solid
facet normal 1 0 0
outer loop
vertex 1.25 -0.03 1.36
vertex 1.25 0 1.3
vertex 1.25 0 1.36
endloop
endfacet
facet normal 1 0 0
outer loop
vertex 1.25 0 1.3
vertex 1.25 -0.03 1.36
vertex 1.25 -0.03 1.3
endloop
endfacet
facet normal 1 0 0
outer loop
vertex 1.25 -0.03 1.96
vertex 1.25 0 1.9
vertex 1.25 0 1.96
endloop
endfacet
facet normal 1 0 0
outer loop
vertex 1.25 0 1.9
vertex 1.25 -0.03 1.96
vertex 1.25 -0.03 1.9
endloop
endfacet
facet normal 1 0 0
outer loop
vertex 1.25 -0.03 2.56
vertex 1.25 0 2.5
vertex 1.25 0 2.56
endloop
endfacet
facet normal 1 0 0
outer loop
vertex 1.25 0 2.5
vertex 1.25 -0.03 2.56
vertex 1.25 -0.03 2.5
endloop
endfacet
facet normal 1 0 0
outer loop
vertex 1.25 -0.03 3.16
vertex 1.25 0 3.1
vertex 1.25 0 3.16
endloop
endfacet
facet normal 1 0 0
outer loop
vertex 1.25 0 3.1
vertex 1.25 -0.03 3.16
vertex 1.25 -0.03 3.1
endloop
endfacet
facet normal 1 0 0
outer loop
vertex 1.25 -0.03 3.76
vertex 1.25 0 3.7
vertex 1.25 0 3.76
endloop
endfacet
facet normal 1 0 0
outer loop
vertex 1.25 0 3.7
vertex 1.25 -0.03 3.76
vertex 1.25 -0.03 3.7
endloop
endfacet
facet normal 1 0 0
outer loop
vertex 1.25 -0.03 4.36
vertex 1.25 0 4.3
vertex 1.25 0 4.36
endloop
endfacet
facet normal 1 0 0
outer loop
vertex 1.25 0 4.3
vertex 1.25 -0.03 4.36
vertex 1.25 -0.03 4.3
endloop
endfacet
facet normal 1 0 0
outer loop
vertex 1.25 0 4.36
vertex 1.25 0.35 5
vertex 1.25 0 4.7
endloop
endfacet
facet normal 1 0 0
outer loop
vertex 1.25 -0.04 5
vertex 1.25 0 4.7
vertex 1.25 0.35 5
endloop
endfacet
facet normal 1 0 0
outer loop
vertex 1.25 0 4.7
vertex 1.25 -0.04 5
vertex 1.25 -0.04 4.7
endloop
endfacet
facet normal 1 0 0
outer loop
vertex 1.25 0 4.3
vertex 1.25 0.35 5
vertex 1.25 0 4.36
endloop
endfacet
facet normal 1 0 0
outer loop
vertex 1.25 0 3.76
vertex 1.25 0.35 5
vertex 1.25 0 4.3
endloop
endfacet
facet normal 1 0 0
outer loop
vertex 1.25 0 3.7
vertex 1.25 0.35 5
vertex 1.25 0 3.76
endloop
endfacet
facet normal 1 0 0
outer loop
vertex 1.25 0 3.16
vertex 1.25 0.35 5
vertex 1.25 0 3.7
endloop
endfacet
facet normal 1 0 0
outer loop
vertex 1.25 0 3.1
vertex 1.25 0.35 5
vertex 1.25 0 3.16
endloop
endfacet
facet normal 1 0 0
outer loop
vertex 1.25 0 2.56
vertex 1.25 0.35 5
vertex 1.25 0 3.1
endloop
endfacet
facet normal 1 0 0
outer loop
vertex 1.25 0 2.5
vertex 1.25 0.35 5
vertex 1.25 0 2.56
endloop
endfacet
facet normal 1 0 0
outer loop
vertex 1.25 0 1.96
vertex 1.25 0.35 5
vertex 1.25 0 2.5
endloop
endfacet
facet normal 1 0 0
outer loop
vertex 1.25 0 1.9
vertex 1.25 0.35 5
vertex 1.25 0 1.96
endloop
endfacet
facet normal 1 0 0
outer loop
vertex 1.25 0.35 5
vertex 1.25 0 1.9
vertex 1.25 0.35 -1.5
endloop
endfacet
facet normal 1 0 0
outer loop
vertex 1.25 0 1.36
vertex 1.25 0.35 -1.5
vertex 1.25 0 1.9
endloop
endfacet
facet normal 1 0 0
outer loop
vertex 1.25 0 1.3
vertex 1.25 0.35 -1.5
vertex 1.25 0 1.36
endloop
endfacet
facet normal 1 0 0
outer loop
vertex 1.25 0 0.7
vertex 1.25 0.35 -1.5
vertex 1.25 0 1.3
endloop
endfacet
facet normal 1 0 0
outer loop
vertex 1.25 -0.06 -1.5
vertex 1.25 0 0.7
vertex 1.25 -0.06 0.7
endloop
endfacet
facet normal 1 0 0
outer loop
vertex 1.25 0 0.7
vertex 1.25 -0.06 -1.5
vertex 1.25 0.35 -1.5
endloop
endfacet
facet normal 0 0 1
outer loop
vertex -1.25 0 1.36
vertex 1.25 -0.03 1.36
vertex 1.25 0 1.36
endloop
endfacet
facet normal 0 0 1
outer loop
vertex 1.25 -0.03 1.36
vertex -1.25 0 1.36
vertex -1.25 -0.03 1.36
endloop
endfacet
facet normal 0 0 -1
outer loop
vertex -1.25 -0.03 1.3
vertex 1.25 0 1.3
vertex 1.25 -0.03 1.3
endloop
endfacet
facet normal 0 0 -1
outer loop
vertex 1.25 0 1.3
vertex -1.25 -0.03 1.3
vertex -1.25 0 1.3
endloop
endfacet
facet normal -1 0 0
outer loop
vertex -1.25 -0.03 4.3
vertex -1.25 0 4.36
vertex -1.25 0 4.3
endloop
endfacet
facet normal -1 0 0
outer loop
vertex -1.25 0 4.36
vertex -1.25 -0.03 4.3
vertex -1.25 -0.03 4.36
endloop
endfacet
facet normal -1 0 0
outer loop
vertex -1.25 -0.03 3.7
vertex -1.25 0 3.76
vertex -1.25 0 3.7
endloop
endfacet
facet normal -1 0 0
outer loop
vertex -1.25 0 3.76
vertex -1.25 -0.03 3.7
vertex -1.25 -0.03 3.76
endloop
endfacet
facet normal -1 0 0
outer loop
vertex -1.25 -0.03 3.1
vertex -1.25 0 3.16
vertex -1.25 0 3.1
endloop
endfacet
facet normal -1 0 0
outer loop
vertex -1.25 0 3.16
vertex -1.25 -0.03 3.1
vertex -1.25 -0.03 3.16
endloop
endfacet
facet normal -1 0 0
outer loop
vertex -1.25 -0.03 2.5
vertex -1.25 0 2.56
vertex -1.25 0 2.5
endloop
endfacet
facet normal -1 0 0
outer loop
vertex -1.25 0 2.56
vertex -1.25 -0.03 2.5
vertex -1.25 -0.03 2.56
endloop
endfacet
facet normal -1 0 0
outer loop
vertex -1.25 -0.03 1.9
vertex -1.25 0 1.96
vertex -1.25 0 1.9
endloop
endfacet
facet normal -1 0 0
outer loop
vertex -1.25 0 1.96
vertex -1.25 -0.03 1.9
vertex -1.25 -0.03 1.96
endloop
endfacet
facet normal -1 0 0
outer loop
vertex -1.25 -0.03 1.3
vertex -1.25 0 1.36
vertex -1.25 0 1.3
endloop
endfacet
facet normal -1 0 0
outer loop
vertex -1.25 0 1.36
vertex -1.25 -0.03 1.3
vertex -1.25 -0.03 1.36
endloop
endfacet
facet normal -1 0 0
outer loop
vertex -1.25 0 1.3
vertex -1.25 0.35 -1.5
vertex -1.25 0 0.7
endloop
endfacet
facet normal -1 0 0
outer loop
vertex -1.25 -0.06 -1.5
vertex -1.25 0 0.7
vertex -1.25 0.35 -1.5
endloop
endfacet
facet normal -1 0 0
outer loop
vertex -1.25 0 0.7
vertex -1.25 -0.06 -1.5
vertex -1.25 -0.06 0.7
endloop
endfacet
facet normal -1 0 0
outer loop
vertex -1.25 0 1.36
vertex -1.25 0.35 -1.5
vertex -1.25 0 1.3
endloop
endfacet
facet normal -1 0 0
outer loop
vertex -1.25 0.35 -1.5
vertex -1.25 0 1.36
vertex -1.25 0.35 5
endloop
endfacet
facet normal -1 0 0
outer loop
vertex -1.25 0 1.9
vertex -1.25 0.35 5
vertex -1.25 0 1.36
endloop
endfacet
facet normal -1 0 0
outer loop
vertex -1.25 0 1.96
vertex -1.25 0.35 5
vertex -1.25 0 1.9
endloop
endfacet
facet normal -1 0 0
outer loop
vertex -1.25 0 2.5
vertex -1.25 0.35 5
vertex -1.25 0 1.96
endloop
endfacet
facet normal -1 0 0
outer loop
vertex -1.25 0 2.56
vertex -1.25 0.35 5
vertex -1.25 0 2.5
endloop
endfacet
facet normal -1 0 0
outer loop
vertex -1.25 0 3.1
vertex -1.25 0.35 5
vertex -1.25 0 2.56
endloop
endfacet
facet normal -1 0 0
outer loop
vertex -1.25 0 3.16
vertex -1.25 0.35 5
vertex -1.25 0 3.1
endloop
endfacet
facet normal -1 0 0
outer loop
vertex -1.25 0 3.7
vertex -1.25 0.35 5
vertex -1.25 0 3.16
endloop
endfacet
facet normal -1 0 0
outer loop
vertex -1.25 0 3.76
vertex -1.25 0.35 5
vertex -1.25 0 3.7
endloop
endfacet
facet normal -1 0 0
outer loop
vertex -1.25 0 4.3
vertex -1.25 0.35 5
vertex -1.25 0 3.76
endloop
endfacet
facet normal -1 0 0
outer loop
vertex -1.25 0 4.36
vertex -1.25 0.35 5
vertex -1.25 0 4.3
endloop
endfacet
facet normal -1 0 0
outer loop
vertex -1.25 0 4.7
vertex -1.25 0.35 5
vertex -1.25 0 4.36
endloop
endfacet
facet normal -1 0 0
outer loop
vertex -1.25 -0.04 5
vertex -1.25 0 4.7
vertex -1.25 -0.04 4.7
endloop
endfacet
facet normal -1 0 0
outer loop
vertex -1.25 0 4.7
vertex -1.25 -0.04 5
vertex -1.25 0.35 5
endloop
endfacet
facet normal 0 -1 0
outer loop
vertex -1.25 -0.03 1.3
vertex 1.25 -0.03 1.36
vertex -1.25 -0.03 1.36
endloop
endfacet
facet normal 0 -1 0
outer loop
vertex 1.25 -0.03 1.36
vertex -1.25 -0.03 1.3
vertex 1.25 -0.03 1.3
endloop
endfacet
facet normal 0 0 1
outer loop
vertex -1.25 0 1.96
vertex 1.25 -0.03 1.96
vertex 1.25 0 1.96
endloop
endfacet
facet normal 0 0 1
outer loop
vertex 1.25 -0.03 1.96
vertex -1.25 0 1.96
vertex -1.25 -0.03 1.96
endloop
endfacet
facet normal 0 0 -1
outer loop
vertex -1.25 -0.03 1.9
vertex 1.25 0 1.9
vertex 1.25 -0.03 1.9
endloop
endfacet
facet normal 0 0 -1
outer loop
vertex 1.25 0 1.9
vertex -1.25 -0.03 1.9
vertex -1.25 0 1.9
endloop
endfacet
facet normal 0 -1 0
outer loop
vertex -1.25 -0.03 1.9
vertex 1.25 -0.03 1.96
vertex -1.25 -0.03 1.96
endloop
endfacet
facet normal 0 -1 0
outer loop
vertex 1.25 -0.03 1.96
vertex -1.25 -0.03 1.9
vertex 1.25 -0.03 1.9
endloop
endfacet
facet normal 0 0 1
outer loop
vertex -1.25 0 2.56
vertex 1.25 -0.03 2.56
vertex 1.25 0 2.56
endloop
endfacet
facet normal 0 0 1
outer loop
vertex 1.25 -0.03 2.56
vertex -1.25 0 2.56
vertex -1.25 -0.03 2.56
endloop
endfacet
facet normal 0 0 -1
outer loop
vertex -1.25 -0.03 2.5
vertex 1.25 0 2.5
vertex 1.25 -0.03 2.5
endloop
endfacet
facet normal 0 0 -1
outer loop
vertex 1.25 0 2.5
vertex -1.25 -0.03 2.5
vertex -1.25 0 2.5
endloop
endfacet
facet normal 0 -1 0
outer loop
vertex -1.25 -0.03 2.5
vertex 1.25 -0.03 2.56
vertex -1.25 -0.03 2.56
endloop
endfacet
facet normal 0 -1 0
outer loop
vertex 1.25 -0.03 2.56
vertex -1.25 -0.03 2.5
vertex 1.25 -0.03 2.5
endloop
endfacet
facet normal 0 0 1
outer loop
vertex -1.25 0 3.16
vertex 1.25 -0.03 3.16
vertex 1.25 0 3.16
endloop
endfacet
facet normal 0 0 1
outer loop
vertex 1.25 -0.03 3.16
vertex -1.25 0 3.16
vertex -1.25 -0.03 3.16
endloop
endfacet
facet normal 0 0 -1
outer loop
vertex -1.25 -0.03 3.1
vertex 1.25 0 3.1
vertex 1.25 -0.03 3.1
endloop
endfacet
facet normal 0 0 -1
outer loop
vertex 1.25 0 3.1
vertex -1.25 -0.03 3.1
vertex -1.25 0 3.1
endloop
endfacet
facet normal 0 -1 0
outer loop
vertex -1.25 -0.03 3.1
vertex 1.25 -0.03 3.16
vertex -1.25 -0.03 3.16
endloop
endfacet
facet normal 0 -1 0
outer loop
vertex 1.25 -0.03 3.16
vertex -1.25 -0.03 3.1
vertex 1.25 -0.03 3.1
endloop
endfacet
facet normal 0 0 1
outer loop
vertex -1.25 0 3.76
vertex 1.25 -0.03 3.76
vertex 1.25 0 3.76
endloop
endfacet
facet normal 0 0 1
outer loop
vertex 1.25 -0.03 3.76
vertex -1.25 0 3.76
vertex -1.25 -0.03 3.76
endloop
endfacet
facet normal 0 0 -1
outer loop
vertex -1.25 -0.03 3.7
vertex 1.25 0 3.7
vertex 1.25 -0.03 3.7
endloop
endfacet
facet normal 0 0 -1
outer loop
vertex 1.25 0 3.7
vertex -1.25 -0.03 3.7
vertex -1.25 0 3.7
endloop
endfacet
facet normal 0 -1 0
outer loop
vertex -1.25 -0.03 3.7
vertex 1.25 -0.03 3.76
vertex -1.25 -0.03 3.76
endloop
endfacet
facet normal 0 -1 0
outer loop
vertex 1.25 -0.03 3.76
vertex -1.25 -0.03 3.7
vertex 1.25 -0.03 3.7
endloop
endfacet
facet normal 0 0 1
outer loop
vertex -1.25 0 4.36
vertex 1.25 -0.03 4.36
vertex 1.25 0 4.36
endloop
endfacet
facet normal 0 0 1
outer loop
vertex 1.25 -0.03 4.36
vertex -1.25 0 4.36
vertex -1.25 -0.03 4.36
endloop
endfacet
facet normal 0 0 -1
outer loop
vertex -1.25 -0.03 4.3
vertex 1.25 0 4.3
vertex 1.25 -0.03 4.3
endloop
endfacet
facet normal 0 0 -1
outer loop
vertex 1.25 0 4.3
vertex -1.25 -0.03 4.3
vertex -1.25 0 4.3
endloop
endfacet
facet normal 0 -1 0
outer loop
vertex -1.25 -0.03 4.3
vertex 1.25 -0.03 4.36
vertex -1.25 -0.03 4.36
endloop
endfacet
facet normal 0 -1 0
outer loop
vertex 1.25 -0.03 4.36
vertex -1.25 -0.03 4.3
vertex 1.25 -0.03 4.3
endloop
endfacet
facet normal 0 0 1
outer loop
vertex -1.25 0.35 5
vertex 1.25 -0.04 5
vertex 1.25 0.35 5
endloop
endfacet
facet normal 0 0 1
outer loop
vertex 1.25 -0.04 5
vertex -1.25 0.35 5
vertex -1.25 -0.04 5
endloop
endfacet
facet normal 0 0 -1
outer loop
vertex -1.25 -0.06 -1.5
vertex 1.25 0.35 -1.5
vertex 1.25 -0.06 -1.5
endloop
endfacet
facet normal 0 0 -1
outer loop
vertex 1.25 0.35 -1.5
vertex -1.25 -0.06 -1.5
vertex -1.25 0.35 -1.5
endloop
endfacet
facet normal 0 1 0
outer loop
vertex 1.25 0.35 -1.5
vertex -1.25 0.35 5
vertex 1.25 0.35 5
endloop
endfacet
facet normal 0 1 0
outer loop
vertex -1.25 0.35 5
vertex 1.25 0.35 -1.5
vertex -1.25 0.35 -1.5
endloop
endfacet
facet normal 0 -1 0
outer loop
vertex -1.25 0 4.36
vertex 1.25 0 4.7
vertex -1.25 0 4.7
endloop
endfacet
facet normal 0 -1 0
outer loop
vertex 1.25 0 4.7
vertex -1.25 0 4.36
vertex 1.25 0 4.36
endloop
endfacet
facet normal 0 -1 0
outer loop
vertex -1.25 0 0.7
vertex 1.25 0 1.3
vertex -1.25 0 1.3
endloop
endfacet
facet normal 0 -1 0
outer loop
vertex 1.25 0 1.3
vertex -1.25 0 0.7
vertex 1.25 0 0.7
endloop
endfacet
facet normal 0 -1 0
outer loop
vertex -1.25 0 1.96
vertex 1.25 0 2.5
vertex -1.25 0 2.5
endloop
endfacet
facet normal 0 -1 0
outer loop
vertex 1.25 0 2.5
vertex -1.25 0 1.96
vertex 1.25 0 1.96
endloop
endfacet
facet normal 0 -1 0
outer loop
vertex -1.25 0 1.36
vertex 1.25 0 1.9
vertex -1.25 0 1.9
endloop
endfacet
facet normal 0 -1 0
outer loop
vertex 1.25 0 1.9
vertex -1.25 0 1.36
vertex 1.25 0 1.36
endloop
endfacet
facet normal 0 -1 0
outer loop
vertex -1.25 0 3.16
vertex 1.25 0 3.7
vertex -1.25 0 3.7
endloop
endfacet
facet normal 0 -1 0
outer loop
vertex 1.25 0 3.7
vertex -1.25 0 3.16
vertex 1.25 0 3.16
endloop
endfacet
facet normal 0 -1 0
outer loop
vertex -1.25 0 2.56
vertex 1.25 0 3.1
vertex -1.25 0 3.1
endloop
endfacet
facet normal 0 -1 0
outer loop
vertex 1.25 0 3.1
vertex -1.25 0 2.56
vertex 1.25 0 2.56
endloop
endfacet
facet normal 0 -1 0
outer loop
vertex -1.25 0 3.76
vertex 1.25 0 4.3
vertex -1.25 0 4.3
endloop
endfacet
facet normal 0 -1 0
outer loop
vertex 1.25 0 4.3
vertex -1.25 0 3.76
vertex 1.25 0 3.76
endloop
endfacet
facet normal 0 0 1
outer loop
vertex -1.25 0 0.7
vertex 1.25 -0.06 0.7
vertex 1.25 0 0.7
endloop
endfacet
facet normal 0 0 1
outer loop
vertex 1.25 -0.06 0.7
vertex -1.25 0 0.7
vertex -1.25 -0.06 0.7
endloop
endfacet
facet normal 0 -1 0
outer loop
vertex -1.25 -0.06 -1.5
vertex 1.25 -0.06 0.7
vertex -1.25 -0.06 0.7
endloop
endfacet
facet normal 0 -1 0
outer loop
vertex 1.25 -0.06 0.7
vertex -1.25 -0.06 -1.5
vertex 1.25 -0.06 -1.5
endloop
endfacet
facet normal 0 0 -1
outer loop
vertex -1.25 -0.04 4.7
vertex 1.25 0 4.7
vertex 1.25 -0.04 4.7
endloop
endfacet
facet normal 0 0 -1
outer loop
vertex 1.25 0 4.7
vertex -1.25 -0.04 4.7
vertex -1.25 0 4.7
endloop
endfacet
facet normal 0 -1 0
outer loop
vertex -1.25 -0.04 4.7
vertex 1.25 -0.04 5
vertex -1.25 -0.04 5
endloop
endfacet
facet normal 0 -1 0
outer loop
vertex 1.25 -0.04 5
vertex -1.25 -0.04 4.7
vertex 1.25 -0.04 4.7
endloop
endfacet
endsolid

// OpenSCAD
// file: lib/lodge_kit.scad
// Lodge shell tile kit — shared dimensions and modules.
//
// The game paints a lodge footprint in 5 m cells and resolves the
// exterior from these tiles at half-cell (2.5 m) resolution; see
// internal/world/lodge_shell.go. Every tile is authored in the same
// canonical frame:
//
//   * origin on the lodge floor plane (Z = 0);
//   * wall-type tiles sit on a footprint edge, centred on it, with the
//     OUTSIDE toward SCAD −Y (game +Z) and the wall thickness toward +Y;
//   * roof tiles are centred on a half-cell, with Z = 0 at the tile's
//     lowest corner; slopes fall toward −Y (game +Z);
//   * corner tiles sit on a grid vertex; an outer corner's building is
//     in the SCAD (−X, +Y) quadrant, an inner corner's notch in (+X, −Y).
//
// Colours are near-neutral: the renderer tints walls and roofs per lodge
// from a seeded palette (world.ShellPalette).
//
// Keep these in sync with the constants in lodge_shell.go.

tile   = 2.5;   // ShellTileSize
wall_h = 5.0;   // ShellWallHeight
rise   = 2.1;   // ShellRoofRise, per tile of run
pitch  = rise / tile;

wall_t   = 0.35;  // wall thickness
sink     = 1.5;   // walls run this far below the floor to hide pad grading
roof_t   = 0.25;  // roof slab thickness
overhang = 0.7;   // eaves overhang past the wall plane

c_wall   = [0.92, 0.90, 0.86];
c_stone  = [0.62, 0.61, 0.60];
c_trim   = [0.97, 0.97, 0.95];
c_glass  = [0.30, 0.42, 0.52];
c_door   = [0.36, 0.25, 0.18];
c_roof   = [0.97, 0.97, 0.97];
c_fascia = [0.55, 0.52, 0.50];

// Plain wall panel: timber above a stone plinth, a trim band under the
// eaves.
module wall_panel() {
    color(c_wall)
        translate([-tile/2, 0, -sink]) cube([tile, wall_t, wall_h + sink]);
    color(c_stone)
        translate([-tile/2, -0.06, -sink]) cube([tile, wall_t, sink + 0.7]);
    color(c_trim)
        translate([-tile/2, -0.04, wall_h - 0.3]) cube([tile, 0.1, 0.3]);
    battens();
}

// Horizontal board lines above the plinth.
module battens() {
    color(c_wall * 0.8)
        for (z = [1.3 : 0.6 : wall_h - 0.6])
            translate([-tile/2, -0.03, z]) cube([tile, 0.04, 0.06]);
}

// A framed pane on the outer face. x0/w along the wall, z0/h up it.
module pane(x0, w, z0, h) {
    color(c_trim)
        translate([x0 - 0.1, -0.05, z0 - 0.1]) cube([w + 0.2, 0.06, h + 0.2]);
    color(c_glass)
        translate([x0, -0.08, z0]) cube([w, 0.06, h]);
}

module wall_window() {
    wall_panel();
    pane(-0.7, 1.4, 1.4, 2.2);
    color(c_trim) translate([-0.02, -0.1, 1.4]) cube([0.04, 0.04, 2.2]); // mullion
}

// Tall window flanked by shutters.
module wall_window_alt() {
    wall_panel();
    pane(-0.5, 1.0, 1.2, 2.8);
    color(c_door) {
        translate([-1.0, -0.1, 1.2]) cube([0.4, 0.05, 2.8]);
        translate([ 0.6, -0.1, 1.2]) cube([0.4, 0.05, 2.8]);
    }
}

// Floor-to-eave glazing for food courts: a low stone sill, then glass in
// three lights.
module wall_glazed() {
    color(c_wall)
        translate([-tile/2, 0, -sink]) cube([tile, wall_t, wall_h + sink]);
    color(c_stone)
        translate([-tile/2, -0.06, -sink]) cube([tile, wall_t, sink + 0.35]);
    color(c_glass)
        translate([-tile/2, -0.09, 0.35]) cube([tile, 0.06, wall_h - 0.75]);
    color(c_trim) {
        for (x = [-tile/2, -tile/6, tile/6, tile/2 - 0.08])
            translate([x, -0.12, 0.35]) cube([0.08, 0.06, wall_h - 0.75]);
        translate([-tile/2, -0.12, wall_h - 0.45]) cube([tile, 0.07, 0.1]);
    }
}

// Glazed entry door under a small canopy, with a step.
module door() {
    color(c_wall)
        translate([-tile/2, 0, -sink]) cube([tile, wall_t, wall_h + sink]);
    color(c_stone)
        translate([-tile/2, -0.06, -sink]) cube([tile, wall_t, sink + 0.15]);
    battens();
    color(c_door)
        translate([-0.9, -0.1, 0]) cube([1.8, 0.1, 2.7]);
    color(c_glass) {
        translate([-0.75, -0.13, 0.9]) cube([0.65, 0.05, 1.6]);
        translate([ 0.10, -0.13, 0.9]) cube([0.65, 0.05, 1.6]);
    }
    color(c_trim)
        translate([-tile/2, -0.04, wall_h - 0.3]) cube([tile, 0.1, 0.3]);
    color(c_roof)   // canopy
        translate([-1.2, -1.3, 3.0])
            rotate([-12, 0, 0]) cube([2.4, 1.3, 0.12]);
    color(c_stone)  // step
        translate([-1.1, -0.9, -0.3]) cube([2.2, 0.9, 0.42]);
}

module corner_outer() {
    color(c_stone)
        translate([-0.3, -0.05, -sink]) cube([0.35, 0.35, wall_h + sink - 0.3]);
}

module corner_inner() {
    color(c_trim)
        translate([0, -0.12, 0]) cube([0.12, 0.12, wall_h - 0.3]);
}

// Roof slab over one half-cell. h lists corner heights (in rise units)
// in SCAD order (−X,+Y), (+X,+Y), (+X,−Y), (−X,−Y); split names which
// diagonal the top surface folds along: 0 through corners 0–2, 1
// through corners 1–3.
module roof_tile(h, split) {
    p = [[-tile/2, tile/2], [tile/2, tile/2], [tile/2, -tile/2], [-tile/2, -tile/2]];
    top = [for (i = [0:3]) [p[i][0], p[i][1], h[i] * rise]];
    bot = [for (i = [0:3]) [p[i][0], p[i][1], h[i] * rise - roof_t]];
    tris = split == 0 ? [[0, 1, 2], [0, 2, 3]] : [[0, 1, 3], [1, 2, 3]];
    color(c_roof)
        polyhedron(
            points = concat(top, bot),
            faces = concat(
                // top (clockwise seen from above = outward in OpenSCAD)
                [for (t = tris) [t[0], t[1], t[2]]],
                [for (t = tris) [t[2] + 4, t[1] + 4, t[0] + 4]],
                [for (i = [0:3]) [i, i + 4, (i + 1) % 4 + 4, (i + 1) % 4]]
            ));
}

// Eaves strip past a wall edge: continues the roof plane outward and
// down, finished with a fascia board.
module eave() {
    drop = overhang * pitch;
    color(c_roof)
        polyhedron(
            points = [
                [-tile/2, 0, 0], [tile/2, 0, 0], [tile/2, -overhang, -drop], [-tile/2, -overhang, -drop],
                [-tile/2, 0, -roof_t], [tile/2, 0, -roof_t], [tile/2, -overhang, -drop - roof_t], [-tile/2, -overhang, -drop - roof_t],
            ],
            faces = [[0, 1, 2, 3], [7, 6, 5, 4], [0, 4, 5, 1], [1, 5, 6, 2], [2, 6, 7, 3], [3, 7, 4, 0]]);
    color(c_fascia)
        translate([-tile/2, -overhang - 0.05, -drop - roof_t - 0.1]) cube([tile, 0.08, roof_t + 0.2]);
}

// Eaves in the square past an outer corner: a hip folding along the
// diagonal away from the building.
module eave_corner() {
    o = overhang;
    d = o * pitch;
    color(c_roof)
        polyhedron(
            points = [
                [0, 0, 0], [o, 0, -d], [o, -o, -d], [0, -o, -d],
                [0, 0, -roof_t], [o, 0, -d - roof_t], [o, -o, -d - roof_t], [0, -o, -d - roof_t],
            ],
            faces = [[0, 1, 2], [0, 2, 3], [6, 5, 4], [7, 6, 4], [0, 4, 5, 1], [1, 5, 6, 2], [2, 6, 7, 3], [3, 7, 4, 0]]);
    color(c_fascia) {
        translate([0, -o - 0.05, -d - roof_t - 0.1]) cube([o + 0.05, 0.08, roof_t + 0.2]);
        translate([o - 0.03, -o - 0.05, -d - roof_t - 0.1]) cube([0.08, o + 0.05, roof_t + 0.2]);
    }
}

module chimney() {
    color(c_stone)
        translate([-0.55, -0.55, -1.0]) cube([1.1, 1.1, rise + 3.0]);
    color(c_fascia)
        translate([-0.65, -0.65, rise + 1.8]) cube([1.3, 1.3, 0.2]);
}
// main file
// Lodge shell kit: plain wall. See lib/lodge_kit.scad.
include <lib/lodge_kit.scad>
wall_panel();
